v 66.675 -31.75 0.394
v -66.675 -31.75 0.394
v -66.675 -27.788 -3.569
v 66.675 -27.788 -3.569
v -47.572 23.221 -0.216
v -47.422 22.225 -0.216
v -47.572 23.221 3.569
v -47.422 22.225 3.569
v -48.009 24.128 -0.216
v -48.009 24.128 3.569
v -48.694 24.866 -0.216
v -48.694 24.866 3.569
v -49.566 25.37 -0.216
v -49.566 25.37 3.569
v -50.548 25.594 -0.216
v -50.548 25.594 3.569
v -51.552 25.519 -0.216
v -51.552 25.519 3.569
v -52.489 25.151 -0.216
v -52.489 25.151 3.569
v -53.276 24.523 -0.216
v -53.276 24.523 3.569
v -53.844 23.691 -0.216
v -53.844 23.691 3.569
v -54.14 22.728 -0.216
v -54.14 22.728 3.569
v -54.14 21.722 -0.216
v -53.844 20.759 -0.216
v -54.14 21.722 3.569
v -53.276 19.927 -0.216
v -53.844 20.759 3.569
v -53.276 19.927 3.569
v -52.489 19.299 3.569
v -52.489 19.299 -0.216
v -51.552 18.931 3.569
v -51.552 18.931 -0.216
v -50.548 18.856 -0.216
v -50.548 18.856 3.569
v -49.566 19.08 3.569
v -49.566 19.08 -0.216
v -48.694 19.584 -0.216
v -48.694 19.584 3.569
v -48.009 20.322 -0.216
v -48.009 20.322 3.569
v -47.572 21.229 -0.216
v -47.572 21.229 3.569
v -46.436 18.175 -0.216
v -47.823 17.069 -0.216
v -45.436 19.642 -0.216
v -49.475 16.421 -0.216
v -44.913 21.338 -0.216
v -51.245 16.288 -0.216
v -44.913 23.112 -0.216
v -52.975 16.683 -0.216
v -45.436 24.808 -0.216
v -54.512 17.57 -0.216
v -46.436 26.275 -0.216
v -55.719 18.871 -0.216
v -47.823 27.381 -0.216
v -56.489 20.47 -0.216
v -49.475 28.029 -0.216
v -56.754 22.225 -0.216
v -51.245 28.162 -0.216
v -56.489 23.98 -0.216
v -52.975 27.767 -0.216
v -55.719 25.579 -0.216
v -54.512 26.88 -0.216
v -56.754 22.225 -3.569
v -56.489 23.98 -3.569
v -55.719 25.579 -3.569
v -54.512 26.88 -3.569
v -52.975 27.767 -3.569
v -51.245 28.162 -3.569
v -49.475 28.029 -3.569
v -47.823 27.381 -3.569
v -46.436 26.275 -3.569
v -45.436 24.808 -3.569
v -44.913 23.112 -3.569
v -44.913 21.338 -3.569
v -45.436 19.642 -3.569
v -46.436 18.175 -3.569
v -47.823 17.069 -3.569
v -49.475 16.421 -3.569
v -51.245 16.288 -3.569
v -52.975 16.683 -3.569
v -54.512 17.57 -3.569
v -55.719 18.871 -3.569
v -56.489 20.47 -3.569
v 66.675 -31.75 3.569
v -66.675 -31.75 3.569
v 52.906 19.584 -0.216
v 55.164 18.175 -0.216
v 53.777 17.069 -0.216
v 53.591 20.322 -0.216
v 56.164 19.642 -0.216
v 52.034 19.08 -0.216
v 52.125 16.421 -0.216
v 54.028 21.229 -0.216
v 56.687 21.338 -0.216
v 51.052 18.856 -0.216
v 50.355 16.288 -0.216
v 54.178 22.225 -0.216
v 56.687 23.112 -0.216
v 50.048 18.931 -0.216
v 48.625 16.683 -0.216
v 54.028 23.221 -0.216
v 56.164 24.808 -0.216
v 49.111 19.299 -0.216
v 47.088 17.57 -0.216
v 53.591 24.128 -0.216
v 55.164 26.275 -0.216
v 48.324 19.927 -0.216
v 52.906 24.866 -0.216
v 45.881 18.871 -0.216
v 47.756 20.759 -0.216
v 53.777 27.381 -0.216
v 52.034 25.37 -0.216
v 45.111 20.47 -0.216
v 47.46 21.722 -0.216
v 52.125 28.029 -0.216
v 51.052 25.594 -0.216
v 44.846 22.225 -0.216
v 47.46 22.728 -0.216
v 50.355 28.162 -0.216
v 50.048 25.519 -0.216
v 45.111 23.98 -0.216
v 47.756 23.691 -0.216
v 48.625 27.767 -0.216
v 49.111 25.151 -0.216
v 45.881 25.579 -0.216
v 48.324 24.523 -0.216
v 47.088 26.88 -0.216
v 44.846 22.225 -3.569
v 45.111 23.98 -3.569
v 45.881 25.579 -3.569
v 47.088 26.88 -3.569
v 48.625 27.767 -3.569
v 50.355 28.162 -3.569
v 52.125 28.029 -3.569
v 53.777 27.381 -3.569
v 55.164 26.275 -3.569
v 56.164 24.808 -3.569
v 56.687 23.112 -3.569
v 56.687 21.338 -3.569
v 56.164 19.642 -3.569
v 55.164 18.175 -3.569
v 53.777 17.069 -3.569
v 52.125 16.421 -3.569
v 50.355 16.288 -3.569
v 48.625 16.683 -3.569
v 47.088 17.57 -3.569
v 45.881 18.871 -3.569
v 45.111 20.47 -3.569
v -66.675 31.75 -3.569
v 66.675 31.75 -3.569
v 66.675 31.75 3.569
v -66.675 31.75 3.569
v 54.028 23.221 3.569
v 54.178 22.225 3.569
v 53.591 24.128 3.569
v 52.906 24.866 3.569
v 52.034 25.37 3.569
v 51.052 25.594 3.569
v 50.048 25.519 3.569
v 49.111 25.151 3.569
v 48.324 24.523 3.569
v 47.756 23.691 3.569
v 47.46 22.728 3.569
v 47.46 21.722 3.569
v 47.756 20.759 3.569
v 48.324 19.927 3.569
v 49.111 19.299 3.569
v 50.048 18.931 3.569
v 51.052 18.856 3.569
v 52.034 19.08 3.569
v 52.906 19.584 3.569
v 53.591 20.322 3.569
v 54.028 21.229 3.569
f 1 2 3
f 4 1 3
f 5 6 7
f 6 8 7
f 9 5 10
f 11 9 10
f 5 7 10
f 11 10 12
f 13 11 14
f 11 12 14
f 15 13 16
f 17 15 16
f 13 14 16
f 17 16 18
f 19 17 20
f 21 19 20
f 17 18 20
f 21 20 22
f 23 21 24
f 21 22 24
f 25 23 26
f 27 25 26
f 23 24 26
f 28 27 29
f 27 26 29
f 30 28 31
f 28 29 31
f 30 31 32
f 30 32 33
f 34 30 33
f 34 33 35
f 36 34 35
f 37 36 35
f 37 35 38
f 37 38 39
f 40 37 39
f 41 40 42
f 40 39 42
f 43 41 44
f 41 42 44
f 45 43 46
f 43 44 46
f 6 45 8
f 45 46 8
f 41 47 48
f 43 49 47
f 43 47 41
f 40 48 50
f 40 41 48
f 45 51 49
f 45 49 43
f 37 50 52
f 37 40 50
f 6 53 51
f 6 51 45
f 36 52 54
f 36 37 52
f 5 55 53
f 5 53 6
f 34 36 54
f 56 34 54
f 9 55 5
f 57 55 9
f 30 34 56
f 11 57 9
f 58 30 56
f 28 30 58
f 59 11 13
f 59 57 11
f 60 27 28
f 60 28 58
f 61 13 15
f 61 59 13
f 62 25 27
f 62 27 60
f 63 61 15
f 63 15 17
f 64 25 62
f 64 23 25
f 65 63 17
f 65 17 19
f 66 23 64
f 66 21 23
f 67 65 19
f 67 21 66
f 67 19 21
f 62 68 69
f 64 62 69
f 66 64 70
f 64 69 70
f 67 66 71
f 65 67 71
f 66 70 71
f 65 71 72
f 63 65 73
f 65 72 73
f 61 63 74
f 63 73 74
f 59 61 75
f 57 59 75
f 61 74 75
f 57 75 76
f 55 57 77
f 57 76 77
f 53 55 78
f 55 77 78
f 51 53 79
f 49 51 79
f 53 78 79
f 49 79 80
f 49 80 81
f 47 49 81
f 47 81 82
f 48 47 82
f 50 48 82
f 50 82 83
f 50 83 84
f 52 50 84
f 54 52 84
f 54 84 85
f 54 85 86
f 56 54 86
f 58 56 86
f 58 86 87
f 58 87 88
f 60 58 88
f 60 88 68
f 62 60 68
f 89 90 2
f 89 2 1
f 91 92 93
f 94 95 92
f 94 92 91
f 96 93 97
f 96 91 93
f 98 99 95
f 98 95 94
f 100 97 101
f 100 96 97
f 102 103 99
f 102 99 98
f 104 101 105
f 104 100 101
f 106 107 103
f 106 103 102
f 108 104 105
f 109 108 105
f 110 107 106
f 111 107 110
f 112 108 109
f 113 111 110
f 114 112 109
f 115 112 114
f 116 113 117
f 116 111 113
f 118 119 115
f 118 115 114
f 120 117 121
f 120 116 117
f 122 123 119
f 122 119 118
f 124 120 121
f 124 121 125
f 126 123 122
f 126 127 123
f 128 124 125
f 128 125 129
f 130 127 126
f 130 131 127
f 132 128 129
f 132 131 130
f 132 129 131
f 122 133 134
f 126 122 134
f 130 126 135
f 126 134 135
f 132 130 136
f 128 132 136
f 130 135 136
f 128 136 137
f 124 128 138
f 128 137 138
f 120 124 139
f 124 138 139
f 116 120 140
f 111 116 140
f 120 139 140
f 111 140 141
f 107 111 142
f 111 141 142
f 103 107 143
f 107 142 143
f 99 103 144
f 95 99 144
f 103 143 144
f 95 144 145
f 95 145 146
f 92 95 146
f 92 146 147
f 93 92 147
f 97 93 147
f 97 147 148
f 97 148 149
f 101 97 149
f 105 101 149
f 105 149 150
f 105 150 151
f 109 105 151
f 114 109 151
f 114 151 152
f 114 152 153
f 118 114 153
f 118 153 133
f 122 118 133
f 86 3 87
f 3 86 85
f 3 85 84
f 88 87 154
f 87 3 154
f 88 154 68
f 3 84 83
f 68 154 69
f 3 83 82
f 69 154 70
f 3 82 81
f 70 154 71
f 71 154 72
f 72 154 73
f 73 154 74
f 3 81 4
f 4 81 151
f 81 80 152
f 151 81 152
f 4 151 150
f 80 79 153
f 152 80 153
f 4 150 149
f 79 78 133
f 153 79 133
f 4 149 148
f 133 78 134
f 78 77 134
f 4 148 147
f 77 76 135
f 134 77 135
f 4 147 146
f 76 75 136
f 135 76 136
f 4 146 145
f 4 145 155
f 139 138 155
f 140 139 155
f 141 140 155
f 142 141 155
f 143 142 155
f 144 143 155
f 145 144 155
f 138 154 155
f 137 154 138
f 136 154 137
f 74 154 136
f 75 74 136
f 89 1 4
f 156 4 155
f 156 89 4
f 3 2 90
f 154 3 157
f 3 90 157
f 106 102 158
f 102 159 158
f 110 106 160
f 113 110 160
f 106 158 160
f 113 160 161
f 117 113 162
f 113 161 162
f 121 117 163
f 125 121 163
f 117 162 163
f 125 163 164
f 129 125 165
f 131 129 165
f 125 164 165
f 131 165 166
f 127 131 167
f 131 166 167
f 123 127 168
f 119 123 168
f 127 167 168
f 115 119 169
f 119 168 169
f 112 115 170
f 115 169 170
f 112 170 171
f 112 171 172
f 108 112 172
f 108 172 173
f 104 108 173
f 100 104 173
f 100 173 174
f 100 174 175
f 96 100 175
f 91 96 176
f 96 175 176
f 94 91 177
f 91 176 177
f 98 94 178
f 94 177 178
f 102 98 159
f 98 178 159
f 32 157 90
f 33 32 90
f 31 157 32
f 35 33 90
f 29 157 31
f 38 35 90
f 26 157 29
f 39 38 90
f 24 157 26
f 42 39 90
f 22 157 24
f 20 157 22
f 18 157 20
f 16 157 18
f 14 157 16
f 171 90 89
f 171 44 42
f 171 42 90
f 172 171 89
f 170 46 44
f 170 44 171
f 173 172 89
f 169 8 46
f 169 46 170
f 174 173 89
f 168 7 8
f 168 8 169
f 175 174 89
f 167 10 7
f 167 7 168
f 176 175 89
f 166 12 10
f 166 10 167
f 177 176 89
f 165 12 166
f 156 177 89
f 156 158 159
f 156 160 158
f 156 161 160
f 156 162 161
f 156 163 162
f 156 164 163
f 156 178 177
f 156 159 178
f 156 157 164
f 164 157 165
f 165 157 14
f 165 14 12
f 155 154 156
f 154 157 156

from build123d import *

# Parameters (mm, degrees)
SKETCH1_W                                        = 133.35
SKETCH1_H                                        = 63.5
BOSS_EXTRUDE1_DEPTH                              = 3.5687
CUT_EXTRUDE1_DEPTH                               = 134.35
CBORE_FOR_1_4_BUTTON_HEAD_CAP_SCREW1_D           = 6.7564
CBORE_FOR_1_4_BUTTON_HEAD_CAP_SCREW1_CBORE_D     = 11.90752
CBORE_FOR_1_4_BUTTON_HEAD_CAP_SCREW1_CBORE_DEPTH = 3.3528


with BuildPart() as part:
    # Sketch1 → Boss-Extrude1 (new body, symmetric)
    with BuildSketch(Plane.XY):
        Rectangle(SKETCH1_W, SKETCH1_H)
    extrude(amount=BOSS_EXTRUDE1_DEPTH, both=True)

    # Sketch2 → Cut-Extrude1 (cut, through all)
    with BuildSketch(Plane.ZY.offset(66.675)):
        Polygon((0.3937, -31.75), (-3.5687, -27.7876), (-3.5687, -31.75), align=None)
    extrude(amount=-CUT_EXTRUDE1_DEPTH, mode=Mode.SUBTRACT)

    # CBORE for 1/4 Button Head Cap Screw1 (through all)
    with Locations(Plane(origin=(0, 0, -3.5687), x_dir=(-1, 0, 0), z_dir=(0, 0, -1))):
        with Locations((-50.8, 22.225), (50.8, 22.225)):
            CounterBoreHole(CBORE_FOR_1_4_BUTTON_HEAD_CAP_SCREW1_D / 2, CBORE_FOR_1_4_BUTTON_HEAD_CAP_SCREW1_CBORE_D / 2, CBORE_FOR_1_4_BUTTON_HEAD_CAP_SCREW1_CBORE_DEPTH)


solid = part.part
